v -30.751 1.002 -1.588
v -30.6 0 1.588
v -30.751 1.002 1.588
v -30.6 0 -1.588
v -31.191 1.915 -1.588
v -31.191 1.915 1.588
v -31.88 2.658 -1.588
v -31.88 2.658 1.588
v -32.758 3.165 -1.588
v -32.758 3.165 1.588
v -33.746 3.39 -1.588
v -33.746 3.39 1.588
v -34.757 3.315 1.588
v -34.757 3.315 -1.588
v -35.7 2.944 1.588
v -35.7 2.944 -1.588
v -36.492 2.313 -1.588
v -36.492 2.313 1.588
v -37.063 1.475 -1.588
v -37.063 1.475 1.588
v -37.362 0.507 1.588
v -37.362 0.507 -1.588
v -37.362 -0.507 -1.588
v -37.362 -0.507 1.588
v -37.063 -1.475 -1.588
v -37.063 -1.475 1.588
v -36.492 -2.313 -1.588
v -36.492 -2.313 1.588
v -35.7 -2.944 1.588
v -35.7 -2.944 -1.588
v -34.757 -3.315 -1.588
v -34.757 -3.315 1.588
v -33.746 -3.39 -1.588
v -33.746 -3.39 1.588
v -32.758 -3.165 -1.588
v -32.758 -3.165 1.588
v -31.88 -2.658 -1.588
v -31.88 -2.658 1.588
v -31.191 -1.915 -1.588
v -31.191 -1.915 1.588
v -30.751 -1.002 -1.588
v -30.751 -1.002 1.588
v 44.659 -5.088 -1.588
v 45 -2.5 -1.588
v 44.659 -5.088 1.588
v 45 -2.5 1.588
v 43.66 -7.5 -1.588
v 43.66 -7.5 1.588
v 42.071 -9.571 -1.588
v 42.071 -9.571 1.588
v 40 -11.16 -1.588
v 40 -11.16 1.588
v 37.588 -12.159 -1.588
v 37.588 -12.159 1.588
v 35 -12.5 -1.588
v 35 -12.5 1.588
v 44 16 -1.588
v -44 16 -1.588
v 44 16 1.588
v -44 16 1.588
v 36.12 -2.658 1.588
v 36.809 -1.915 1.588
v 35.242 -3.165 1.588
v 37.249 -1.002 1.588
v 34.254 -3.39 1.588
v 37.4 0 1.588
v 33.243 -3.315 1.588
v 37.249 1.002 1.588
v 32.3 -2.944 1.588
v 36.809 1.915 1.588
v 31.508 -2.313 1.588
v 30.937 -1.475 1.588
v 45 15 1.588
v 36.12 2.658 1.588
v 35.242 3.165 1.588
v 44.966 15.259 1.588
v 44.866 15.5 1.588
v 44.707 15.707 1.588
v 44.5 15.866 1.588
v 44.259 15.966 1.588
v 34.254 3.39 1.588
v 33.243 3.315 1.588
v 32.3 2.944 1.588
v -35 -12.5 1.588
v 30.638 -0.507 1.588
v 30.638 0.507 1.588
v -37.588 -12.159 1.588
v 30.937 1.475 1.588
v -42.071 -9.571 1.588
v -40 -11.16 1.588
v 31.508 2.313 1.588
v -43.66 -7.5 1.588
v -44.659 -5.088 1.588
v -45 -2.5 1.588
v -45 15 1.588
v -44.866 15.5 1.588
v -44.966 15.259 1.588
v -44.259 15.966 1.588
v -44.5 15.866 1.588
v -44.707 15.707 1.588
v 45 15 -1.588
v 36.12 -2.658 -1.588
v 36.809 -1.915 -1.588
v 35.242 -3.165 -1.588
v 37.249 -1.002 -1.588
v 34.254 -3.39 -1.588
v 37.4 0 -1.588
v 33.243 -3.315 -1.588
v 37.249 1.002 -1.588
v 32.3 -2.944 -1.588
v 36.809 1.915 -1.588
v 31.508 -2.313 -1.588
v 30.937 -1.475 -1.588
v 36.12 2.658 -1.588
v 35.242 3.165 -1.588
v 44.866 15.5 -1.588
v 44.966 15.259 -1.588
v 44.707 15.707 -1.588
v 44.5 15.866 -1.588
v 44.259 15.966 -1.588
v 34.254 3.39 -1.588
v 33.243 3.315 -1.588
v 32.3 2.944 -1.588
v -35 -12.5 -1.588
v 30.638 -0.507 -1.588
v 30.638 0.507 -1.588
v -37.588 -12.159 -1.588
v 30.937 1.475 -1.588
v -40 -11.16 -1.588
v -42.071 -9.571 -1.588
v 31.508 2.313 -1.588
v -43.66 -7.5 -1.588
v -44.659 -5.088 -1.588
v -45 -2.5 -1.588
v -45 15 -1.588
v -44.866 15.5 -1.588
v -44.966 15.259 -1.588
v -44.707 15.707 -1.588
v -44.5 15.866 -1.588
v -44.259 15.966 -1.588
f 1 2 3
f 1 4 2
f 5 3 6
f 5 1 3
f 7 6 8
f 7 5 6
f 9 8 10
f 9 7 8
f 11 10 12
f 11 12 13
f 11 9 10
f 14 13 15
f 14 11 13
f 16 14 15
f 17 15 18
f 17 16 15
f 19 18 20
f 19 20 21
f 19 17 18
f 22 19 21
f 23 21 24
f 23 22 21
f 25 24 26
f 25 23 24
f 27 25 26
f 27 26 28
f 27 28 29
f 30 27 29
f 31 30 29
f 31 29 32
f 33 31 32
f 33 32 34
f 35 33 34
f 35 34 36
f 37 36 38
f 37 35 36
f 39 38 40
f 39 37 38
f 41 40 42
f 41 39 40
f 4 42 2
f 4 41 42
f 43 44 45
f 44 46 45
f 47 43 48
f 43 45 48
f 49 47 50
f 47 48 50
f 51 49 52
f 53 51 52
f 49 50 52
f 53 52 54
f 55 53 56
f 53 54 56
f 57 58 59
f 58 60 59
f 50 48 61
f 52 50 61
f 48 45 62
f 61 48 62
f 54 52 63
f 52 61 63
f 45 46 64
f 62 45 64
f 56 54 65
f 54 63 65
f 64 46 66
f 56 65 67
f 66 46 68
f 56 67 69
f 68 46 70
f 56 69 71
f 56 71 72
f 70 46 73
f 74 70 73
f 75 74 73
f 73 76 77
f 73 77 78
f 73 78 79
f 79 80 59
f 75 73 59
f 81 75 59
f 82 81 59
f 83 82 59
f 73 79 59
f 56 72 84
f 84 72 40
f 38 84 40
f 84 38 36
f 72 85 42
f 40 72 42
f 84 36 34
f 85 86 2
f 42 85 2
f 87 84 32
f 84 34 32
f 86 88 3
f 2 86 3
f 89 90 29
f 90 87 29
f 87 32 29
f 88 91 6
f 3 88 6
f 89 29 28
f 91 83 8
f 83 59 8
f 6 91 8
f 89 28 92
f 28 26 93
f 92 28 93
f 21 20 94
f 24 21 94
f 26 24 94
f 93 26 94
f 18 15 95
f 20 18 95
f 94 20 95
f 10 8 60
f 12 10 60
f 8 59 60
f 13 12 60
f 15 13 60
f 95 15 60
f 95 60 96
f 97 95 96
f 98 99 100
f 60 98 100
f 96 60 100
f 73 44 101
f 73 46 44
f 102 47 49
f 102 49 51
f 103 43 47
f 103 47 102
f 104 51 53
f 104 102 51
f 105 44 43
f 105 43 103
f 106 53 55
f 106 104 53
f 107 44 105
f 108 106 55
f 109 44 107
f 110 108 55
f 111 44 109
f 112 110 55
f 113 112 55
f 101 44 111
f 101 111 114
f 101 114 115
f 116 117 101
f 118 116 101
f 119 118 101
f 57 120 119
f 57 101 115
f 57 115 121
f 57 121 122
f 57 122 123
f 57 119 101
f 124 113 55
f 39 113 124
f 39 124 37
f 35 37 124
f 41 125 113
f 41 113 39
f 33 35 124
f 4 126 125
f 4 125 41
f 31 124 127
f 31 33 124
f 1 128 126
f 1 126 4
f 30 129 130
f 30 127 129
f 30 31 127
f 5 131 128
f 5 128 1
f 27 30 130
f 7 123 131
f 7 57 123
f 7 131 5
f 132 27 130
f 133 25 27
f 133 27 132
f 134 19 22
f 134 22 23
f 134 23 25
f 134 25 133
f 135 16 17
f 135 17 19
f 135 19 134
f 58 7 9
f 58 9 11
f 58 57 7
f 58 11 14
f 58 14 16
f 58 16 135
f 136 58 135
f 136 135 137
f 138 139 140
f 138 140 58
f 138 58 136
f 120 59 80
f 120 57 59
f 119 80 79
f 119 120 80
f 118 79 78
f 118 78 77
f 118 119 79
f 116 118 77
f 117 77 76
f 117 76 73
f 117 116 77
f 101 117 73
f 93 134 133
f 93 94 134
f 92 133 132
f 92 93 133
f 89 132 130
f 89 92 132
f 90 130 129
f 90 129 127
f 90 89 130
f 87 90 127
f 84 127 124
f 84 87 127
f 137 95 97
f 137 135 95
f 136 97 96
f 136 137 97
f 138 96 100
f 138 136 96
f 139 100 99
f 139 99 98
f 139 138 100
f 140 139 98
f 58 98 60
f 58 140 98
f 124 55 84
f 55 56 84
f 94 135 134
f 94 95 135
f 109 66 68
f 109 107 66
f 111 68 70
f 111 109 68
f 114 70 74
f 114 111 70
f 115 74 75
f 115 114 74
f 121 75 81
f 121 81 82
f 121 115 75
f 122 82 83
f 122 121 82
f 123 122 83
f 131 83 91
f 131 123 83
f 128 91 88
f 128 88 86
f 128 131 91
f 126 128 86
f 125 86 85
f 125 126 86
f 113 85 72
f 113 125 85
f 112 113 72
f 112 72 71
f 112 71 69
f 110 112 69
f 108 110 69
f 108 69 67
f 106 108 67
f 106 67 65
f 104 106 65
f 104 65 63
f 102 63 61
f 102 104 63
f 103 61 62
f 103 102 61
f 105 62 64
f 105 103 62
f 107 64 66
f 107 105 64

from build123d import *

# Parameters (mm, degrees)
SKETCH1_R           = 3.4
BOSS_EXTRUDE1_DEPTH = 1.5875
FILLET1_R           = 10
FILLET2_R           = 1


with BuildPart() as part:
    # Sketch1 → Boss-Extrude1 (new, symmetric)
    with BuildSketch(Plane.XY):
        Polygon((-45, 12.499999995), (-45, 15.999999995), (45, 15.999999995), (45, 12.499999995), (45, -12.499999995), (-45, -12.499999995), align=None)
        with Locations((34, 0)):
            Circle(SKETCH1_R, mode=Mode.SUBTRACT)
        with Locations((-34, 0)):
            Circle(SKETCH1_R, mode=Mode.SUBTRACT)
    extrude(amount=BOSS_EXTRUDE1_DEPTH, both=True)

    # Fillet1
    fillet1_edges = [part.edges().sort_by_distance(p)[0] for p in [
        (45, -12.499999995, 0),
        (-45, -12.499999995, 0),
    ]]
    fillet(fillet1_edges, radius=FILLET1_R)

    # Fillet2
    fillet2_edges = [part.edges().sort_by_distance(p)[0] for p in [
        (-45, 15.999999995, 0),
        (45, 15.999999995, 0),
    ]]
    fillet(fillet2_edges, radius=FILLET2_R)


solid = part.part
